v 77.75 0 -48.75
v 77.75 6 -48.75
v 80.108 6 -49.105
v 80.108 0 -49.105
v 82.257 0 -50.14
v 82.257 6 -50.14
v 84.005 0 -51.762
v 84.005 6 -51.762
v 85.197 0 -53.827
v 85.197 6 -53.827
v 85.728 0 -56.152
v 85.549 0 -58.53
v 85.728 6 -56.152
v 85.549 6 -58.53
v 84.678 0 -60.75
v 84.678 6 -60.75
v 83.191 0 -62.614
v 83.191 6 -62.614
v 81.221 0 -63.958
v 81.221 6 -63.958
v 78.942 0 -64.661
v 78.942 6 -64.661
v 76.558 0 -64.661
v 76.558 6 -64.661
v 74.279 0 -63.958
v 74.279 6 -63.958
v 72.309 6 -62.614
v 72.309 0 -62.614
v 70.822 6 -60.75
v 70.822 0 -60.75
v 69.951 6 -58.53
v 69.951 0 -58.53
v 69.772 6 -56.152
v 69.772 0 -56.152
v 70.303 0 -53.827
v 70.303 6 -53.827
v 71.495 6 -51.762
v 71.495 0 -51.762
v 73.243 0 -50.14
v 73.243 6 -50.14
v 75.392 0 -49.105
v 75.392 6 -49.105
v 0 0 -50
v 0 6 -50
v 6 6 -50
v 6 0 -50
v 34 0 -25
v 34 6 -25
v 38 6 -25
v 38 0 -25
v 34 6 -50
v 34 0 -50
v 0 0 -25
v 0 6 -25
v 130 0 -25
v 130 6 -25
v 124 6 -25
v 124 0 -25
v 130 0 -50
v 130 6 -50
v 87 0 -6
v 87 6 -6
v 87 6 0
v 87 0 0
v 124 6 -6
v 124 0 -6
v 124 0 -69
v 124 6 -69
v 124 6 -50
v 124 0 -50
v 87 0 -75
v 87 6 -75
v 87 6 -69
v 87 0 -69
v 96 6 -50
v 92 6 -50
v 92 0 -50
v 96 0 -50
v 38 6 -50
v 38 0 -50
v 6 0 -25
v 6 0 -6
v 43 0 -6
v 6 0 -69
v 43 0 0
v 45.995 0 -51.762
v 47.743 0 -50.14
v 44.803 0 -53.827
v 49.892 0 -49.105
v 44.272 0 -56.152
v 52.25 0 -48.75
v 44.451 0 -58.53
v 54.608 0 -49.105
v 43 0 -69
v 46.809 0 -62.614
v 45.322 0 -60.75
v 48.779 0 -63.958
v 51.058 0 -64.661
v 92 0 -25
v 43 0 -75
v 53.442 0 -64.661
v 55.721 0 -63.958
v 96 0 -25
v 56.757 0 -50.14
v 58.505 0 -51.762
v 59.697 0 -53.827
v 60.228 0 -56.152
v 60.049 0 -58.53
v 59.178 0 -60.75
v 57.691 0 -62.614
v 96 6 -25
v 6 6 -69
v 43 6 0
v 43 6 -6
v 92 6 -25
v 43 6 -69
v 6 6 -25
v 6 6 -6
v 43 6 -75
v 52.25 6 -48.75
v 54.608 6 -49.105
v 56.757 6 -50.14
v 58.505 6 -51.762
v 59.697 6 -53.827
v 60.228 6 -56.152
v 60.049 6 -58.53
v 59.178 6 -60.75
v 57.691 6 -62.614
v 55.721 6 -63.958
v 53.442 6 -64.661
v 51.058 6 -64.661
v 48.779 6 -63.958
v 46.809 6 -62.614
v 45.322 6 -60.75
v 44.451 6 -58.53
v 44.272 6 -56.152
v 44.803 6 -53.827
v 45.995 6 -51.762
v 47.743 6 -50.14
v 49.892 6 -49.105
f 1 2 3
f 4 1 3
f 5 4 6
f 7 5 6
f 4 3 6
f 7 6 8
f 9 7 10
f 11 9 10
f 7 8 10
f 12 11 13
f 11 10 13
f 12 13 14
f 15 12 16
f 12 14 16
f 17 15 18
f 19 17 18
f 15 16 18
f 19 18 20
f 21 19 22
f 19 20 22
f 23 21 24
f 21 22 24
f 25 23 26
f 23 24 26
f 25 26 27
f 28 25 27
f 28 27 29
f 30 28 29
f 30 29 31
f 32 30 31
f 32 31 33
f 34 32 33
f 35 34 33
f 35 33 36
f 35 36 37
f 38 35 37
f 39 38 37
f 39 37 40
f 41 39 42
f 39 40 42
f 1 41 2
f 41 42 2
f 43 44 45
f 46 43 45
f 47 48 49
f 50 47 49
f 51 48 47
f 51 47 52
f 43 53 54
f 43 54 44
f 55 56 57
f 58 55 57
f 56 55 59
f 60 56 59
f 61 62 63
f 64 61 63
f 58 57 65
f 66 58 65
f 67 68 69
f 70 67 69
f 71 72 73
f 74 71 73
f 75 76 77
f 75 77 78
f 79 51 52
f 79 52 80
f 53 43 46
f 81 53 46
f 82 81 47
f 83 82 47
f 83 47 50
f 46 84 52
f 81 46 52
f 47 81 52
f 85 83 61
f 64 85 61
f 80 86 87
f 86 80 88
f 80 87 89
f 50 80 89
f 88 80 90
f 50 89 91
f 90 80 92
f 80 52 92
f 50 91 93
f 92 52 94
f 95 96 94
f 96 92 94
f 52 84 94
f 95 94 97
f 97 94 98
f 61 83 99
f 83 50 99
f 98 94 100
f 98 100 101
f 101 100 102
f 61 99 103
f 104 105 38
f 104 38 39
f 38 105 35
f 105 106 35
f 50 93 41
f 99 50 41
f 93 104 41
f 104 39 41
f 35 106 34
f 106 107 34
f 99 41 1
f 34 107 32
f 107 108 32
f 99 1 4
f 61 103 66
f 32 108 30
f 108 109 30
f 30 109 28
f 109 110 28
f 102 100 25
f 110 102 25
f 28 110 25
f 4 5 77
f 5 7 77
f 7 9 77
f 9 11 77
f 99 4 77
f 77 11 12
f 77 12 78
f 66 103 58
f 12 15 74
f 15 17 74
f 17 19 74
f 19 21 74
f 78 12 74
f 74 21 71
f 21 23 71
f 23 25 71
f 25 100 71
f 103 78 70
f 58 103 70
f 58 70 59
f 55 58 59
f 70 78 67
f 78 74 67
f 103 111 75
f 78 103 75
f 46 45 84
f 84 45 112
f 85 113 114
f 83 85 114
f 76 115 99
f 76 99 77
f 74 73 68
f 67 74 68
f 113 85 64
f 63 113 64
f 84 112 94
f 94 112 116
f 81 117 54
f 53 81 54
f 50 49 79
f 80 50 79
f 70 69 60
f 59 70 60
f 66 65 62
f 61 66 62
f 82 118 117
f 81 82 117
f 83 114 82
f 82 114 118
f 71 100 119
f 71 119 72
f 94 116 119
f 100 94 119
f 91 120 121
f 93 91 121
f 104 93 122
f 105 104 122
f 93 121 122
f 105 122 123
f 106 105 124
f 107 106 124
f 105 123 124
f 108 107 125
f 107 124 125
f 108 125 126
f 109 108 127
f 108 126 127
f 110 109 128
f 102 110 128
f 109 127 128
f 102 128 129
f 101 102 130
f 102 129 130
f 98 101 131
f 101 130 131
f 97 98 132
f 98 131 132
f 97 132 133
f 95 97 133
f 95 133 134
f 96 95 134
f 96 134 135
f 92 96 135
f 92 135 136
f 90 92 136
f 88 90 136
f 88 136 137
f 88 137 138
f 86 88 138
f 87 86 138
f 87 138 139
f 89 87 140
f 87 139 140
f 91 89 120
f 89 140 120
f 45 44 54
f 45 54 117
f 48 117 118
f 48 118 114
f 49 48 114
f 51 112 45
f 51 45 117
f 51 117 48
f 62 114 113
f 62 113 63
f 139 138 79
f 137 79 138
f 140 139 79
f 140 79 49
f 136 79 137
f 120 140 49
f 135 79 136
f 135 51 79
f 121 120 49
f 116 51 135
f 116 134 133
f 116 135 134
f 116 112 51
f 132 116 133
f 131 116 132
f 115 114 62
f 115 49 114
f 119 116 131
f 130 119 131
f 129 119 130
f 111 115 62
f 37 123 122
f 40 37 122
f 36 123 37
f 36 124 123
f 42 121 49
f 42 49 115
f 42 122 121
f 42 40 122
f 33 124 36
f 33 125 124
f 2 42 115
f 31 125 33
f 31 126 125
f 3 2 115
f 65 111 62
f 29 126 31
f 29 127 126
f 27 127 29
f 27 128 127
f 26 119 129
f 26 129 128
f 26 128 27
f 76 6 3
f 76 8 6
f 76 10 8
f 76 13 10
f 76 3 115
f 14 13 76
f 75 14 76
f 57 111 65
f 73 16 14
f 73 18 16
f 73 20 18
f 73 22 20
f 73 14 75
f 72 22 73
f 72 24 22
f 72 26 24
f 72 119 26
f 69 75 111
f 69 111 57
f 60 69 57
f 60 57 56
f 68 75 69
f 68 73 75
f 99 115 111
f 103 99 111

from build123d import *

# Parameters (mm, degrees)
SKETCH1_W           = 130
SKETCH1_H           = 75
BOSS_EXTRUDE1_DEPTH = 6
SKETCH2_R           = 8
CUT_EXTRUDE1_DEPTH  = 6
SKETCH3_W           = 4
SKETCH3_H           = 25
CUT_EXTRUDE2_DEPTH  = 151.203195705


with BuildPart() as part:
    # Sketch1 → Boss-Extrude1 (new body)
    with BuildSketch(Plane(origin=(0, 0, 0), x_dir=(1, 0, 0), z_dir=(0, 1, 0))):
        with Locations((65, 37.5)):
            Rectangle(SKETCH1_W, SKETCH1_H)
    extrude(amount=BOSS_EXTRUDE1_DEPTH)

    # Sketch2 → Cut-Extrude1 (cut)
    with BuildSketch(Plane(origin=(0, 6, 0), x_dir=(1, 0, 0), z_dir=(0, 1, 0))):
        with Locations(Location((52.25, 56.75, 0), (0, 0, 270))):
            Circle(SKETCH2_R)
        with Locations(Location((77.75, 56.75, 0), (0, 0, 270))):
            Circle(SKETCH2_R)
    extrude(amount=-CUT_EXTRUDE1_DEPTH, mode=Mode.SUBTRACT)

    # Sketch3 → Cut-Extrude2 (cut, through all)
    with BuildSketch(Plane(origin=(0, 6, 0), x_dir=(1, 0, 0), z_dir=(0, 1, 0))):
        Polygon((0, 0), (43, 0), (43, 6), (6, 6), (6, 25), (0, 25), align=None)
        Polygon((0, 50), (6, 50), (6, 69), (43, 69), (43, 75), (0, 75), align=None)
        with Locations((36, 37.5)):
            Rectangle(SKETCH3_W, SKETCH3_H)
        Polygon((87, 6), (87, 0), (130, 0), (130, 25), (124, 25), (124, 6), align=None)
        with Locations((94, 37.5)):
            Rectangle(SKETCH3_W, SKETCH3_H)
        Polygon((87, 75), (87, 69), (124, 69), (124, 50), (130, 50), (130, 75), align=None)
    extrude(amount=-CUT_EXTRUDE2_DEPTH, mode=Mode.SUBTRACT)


solid = part.part
